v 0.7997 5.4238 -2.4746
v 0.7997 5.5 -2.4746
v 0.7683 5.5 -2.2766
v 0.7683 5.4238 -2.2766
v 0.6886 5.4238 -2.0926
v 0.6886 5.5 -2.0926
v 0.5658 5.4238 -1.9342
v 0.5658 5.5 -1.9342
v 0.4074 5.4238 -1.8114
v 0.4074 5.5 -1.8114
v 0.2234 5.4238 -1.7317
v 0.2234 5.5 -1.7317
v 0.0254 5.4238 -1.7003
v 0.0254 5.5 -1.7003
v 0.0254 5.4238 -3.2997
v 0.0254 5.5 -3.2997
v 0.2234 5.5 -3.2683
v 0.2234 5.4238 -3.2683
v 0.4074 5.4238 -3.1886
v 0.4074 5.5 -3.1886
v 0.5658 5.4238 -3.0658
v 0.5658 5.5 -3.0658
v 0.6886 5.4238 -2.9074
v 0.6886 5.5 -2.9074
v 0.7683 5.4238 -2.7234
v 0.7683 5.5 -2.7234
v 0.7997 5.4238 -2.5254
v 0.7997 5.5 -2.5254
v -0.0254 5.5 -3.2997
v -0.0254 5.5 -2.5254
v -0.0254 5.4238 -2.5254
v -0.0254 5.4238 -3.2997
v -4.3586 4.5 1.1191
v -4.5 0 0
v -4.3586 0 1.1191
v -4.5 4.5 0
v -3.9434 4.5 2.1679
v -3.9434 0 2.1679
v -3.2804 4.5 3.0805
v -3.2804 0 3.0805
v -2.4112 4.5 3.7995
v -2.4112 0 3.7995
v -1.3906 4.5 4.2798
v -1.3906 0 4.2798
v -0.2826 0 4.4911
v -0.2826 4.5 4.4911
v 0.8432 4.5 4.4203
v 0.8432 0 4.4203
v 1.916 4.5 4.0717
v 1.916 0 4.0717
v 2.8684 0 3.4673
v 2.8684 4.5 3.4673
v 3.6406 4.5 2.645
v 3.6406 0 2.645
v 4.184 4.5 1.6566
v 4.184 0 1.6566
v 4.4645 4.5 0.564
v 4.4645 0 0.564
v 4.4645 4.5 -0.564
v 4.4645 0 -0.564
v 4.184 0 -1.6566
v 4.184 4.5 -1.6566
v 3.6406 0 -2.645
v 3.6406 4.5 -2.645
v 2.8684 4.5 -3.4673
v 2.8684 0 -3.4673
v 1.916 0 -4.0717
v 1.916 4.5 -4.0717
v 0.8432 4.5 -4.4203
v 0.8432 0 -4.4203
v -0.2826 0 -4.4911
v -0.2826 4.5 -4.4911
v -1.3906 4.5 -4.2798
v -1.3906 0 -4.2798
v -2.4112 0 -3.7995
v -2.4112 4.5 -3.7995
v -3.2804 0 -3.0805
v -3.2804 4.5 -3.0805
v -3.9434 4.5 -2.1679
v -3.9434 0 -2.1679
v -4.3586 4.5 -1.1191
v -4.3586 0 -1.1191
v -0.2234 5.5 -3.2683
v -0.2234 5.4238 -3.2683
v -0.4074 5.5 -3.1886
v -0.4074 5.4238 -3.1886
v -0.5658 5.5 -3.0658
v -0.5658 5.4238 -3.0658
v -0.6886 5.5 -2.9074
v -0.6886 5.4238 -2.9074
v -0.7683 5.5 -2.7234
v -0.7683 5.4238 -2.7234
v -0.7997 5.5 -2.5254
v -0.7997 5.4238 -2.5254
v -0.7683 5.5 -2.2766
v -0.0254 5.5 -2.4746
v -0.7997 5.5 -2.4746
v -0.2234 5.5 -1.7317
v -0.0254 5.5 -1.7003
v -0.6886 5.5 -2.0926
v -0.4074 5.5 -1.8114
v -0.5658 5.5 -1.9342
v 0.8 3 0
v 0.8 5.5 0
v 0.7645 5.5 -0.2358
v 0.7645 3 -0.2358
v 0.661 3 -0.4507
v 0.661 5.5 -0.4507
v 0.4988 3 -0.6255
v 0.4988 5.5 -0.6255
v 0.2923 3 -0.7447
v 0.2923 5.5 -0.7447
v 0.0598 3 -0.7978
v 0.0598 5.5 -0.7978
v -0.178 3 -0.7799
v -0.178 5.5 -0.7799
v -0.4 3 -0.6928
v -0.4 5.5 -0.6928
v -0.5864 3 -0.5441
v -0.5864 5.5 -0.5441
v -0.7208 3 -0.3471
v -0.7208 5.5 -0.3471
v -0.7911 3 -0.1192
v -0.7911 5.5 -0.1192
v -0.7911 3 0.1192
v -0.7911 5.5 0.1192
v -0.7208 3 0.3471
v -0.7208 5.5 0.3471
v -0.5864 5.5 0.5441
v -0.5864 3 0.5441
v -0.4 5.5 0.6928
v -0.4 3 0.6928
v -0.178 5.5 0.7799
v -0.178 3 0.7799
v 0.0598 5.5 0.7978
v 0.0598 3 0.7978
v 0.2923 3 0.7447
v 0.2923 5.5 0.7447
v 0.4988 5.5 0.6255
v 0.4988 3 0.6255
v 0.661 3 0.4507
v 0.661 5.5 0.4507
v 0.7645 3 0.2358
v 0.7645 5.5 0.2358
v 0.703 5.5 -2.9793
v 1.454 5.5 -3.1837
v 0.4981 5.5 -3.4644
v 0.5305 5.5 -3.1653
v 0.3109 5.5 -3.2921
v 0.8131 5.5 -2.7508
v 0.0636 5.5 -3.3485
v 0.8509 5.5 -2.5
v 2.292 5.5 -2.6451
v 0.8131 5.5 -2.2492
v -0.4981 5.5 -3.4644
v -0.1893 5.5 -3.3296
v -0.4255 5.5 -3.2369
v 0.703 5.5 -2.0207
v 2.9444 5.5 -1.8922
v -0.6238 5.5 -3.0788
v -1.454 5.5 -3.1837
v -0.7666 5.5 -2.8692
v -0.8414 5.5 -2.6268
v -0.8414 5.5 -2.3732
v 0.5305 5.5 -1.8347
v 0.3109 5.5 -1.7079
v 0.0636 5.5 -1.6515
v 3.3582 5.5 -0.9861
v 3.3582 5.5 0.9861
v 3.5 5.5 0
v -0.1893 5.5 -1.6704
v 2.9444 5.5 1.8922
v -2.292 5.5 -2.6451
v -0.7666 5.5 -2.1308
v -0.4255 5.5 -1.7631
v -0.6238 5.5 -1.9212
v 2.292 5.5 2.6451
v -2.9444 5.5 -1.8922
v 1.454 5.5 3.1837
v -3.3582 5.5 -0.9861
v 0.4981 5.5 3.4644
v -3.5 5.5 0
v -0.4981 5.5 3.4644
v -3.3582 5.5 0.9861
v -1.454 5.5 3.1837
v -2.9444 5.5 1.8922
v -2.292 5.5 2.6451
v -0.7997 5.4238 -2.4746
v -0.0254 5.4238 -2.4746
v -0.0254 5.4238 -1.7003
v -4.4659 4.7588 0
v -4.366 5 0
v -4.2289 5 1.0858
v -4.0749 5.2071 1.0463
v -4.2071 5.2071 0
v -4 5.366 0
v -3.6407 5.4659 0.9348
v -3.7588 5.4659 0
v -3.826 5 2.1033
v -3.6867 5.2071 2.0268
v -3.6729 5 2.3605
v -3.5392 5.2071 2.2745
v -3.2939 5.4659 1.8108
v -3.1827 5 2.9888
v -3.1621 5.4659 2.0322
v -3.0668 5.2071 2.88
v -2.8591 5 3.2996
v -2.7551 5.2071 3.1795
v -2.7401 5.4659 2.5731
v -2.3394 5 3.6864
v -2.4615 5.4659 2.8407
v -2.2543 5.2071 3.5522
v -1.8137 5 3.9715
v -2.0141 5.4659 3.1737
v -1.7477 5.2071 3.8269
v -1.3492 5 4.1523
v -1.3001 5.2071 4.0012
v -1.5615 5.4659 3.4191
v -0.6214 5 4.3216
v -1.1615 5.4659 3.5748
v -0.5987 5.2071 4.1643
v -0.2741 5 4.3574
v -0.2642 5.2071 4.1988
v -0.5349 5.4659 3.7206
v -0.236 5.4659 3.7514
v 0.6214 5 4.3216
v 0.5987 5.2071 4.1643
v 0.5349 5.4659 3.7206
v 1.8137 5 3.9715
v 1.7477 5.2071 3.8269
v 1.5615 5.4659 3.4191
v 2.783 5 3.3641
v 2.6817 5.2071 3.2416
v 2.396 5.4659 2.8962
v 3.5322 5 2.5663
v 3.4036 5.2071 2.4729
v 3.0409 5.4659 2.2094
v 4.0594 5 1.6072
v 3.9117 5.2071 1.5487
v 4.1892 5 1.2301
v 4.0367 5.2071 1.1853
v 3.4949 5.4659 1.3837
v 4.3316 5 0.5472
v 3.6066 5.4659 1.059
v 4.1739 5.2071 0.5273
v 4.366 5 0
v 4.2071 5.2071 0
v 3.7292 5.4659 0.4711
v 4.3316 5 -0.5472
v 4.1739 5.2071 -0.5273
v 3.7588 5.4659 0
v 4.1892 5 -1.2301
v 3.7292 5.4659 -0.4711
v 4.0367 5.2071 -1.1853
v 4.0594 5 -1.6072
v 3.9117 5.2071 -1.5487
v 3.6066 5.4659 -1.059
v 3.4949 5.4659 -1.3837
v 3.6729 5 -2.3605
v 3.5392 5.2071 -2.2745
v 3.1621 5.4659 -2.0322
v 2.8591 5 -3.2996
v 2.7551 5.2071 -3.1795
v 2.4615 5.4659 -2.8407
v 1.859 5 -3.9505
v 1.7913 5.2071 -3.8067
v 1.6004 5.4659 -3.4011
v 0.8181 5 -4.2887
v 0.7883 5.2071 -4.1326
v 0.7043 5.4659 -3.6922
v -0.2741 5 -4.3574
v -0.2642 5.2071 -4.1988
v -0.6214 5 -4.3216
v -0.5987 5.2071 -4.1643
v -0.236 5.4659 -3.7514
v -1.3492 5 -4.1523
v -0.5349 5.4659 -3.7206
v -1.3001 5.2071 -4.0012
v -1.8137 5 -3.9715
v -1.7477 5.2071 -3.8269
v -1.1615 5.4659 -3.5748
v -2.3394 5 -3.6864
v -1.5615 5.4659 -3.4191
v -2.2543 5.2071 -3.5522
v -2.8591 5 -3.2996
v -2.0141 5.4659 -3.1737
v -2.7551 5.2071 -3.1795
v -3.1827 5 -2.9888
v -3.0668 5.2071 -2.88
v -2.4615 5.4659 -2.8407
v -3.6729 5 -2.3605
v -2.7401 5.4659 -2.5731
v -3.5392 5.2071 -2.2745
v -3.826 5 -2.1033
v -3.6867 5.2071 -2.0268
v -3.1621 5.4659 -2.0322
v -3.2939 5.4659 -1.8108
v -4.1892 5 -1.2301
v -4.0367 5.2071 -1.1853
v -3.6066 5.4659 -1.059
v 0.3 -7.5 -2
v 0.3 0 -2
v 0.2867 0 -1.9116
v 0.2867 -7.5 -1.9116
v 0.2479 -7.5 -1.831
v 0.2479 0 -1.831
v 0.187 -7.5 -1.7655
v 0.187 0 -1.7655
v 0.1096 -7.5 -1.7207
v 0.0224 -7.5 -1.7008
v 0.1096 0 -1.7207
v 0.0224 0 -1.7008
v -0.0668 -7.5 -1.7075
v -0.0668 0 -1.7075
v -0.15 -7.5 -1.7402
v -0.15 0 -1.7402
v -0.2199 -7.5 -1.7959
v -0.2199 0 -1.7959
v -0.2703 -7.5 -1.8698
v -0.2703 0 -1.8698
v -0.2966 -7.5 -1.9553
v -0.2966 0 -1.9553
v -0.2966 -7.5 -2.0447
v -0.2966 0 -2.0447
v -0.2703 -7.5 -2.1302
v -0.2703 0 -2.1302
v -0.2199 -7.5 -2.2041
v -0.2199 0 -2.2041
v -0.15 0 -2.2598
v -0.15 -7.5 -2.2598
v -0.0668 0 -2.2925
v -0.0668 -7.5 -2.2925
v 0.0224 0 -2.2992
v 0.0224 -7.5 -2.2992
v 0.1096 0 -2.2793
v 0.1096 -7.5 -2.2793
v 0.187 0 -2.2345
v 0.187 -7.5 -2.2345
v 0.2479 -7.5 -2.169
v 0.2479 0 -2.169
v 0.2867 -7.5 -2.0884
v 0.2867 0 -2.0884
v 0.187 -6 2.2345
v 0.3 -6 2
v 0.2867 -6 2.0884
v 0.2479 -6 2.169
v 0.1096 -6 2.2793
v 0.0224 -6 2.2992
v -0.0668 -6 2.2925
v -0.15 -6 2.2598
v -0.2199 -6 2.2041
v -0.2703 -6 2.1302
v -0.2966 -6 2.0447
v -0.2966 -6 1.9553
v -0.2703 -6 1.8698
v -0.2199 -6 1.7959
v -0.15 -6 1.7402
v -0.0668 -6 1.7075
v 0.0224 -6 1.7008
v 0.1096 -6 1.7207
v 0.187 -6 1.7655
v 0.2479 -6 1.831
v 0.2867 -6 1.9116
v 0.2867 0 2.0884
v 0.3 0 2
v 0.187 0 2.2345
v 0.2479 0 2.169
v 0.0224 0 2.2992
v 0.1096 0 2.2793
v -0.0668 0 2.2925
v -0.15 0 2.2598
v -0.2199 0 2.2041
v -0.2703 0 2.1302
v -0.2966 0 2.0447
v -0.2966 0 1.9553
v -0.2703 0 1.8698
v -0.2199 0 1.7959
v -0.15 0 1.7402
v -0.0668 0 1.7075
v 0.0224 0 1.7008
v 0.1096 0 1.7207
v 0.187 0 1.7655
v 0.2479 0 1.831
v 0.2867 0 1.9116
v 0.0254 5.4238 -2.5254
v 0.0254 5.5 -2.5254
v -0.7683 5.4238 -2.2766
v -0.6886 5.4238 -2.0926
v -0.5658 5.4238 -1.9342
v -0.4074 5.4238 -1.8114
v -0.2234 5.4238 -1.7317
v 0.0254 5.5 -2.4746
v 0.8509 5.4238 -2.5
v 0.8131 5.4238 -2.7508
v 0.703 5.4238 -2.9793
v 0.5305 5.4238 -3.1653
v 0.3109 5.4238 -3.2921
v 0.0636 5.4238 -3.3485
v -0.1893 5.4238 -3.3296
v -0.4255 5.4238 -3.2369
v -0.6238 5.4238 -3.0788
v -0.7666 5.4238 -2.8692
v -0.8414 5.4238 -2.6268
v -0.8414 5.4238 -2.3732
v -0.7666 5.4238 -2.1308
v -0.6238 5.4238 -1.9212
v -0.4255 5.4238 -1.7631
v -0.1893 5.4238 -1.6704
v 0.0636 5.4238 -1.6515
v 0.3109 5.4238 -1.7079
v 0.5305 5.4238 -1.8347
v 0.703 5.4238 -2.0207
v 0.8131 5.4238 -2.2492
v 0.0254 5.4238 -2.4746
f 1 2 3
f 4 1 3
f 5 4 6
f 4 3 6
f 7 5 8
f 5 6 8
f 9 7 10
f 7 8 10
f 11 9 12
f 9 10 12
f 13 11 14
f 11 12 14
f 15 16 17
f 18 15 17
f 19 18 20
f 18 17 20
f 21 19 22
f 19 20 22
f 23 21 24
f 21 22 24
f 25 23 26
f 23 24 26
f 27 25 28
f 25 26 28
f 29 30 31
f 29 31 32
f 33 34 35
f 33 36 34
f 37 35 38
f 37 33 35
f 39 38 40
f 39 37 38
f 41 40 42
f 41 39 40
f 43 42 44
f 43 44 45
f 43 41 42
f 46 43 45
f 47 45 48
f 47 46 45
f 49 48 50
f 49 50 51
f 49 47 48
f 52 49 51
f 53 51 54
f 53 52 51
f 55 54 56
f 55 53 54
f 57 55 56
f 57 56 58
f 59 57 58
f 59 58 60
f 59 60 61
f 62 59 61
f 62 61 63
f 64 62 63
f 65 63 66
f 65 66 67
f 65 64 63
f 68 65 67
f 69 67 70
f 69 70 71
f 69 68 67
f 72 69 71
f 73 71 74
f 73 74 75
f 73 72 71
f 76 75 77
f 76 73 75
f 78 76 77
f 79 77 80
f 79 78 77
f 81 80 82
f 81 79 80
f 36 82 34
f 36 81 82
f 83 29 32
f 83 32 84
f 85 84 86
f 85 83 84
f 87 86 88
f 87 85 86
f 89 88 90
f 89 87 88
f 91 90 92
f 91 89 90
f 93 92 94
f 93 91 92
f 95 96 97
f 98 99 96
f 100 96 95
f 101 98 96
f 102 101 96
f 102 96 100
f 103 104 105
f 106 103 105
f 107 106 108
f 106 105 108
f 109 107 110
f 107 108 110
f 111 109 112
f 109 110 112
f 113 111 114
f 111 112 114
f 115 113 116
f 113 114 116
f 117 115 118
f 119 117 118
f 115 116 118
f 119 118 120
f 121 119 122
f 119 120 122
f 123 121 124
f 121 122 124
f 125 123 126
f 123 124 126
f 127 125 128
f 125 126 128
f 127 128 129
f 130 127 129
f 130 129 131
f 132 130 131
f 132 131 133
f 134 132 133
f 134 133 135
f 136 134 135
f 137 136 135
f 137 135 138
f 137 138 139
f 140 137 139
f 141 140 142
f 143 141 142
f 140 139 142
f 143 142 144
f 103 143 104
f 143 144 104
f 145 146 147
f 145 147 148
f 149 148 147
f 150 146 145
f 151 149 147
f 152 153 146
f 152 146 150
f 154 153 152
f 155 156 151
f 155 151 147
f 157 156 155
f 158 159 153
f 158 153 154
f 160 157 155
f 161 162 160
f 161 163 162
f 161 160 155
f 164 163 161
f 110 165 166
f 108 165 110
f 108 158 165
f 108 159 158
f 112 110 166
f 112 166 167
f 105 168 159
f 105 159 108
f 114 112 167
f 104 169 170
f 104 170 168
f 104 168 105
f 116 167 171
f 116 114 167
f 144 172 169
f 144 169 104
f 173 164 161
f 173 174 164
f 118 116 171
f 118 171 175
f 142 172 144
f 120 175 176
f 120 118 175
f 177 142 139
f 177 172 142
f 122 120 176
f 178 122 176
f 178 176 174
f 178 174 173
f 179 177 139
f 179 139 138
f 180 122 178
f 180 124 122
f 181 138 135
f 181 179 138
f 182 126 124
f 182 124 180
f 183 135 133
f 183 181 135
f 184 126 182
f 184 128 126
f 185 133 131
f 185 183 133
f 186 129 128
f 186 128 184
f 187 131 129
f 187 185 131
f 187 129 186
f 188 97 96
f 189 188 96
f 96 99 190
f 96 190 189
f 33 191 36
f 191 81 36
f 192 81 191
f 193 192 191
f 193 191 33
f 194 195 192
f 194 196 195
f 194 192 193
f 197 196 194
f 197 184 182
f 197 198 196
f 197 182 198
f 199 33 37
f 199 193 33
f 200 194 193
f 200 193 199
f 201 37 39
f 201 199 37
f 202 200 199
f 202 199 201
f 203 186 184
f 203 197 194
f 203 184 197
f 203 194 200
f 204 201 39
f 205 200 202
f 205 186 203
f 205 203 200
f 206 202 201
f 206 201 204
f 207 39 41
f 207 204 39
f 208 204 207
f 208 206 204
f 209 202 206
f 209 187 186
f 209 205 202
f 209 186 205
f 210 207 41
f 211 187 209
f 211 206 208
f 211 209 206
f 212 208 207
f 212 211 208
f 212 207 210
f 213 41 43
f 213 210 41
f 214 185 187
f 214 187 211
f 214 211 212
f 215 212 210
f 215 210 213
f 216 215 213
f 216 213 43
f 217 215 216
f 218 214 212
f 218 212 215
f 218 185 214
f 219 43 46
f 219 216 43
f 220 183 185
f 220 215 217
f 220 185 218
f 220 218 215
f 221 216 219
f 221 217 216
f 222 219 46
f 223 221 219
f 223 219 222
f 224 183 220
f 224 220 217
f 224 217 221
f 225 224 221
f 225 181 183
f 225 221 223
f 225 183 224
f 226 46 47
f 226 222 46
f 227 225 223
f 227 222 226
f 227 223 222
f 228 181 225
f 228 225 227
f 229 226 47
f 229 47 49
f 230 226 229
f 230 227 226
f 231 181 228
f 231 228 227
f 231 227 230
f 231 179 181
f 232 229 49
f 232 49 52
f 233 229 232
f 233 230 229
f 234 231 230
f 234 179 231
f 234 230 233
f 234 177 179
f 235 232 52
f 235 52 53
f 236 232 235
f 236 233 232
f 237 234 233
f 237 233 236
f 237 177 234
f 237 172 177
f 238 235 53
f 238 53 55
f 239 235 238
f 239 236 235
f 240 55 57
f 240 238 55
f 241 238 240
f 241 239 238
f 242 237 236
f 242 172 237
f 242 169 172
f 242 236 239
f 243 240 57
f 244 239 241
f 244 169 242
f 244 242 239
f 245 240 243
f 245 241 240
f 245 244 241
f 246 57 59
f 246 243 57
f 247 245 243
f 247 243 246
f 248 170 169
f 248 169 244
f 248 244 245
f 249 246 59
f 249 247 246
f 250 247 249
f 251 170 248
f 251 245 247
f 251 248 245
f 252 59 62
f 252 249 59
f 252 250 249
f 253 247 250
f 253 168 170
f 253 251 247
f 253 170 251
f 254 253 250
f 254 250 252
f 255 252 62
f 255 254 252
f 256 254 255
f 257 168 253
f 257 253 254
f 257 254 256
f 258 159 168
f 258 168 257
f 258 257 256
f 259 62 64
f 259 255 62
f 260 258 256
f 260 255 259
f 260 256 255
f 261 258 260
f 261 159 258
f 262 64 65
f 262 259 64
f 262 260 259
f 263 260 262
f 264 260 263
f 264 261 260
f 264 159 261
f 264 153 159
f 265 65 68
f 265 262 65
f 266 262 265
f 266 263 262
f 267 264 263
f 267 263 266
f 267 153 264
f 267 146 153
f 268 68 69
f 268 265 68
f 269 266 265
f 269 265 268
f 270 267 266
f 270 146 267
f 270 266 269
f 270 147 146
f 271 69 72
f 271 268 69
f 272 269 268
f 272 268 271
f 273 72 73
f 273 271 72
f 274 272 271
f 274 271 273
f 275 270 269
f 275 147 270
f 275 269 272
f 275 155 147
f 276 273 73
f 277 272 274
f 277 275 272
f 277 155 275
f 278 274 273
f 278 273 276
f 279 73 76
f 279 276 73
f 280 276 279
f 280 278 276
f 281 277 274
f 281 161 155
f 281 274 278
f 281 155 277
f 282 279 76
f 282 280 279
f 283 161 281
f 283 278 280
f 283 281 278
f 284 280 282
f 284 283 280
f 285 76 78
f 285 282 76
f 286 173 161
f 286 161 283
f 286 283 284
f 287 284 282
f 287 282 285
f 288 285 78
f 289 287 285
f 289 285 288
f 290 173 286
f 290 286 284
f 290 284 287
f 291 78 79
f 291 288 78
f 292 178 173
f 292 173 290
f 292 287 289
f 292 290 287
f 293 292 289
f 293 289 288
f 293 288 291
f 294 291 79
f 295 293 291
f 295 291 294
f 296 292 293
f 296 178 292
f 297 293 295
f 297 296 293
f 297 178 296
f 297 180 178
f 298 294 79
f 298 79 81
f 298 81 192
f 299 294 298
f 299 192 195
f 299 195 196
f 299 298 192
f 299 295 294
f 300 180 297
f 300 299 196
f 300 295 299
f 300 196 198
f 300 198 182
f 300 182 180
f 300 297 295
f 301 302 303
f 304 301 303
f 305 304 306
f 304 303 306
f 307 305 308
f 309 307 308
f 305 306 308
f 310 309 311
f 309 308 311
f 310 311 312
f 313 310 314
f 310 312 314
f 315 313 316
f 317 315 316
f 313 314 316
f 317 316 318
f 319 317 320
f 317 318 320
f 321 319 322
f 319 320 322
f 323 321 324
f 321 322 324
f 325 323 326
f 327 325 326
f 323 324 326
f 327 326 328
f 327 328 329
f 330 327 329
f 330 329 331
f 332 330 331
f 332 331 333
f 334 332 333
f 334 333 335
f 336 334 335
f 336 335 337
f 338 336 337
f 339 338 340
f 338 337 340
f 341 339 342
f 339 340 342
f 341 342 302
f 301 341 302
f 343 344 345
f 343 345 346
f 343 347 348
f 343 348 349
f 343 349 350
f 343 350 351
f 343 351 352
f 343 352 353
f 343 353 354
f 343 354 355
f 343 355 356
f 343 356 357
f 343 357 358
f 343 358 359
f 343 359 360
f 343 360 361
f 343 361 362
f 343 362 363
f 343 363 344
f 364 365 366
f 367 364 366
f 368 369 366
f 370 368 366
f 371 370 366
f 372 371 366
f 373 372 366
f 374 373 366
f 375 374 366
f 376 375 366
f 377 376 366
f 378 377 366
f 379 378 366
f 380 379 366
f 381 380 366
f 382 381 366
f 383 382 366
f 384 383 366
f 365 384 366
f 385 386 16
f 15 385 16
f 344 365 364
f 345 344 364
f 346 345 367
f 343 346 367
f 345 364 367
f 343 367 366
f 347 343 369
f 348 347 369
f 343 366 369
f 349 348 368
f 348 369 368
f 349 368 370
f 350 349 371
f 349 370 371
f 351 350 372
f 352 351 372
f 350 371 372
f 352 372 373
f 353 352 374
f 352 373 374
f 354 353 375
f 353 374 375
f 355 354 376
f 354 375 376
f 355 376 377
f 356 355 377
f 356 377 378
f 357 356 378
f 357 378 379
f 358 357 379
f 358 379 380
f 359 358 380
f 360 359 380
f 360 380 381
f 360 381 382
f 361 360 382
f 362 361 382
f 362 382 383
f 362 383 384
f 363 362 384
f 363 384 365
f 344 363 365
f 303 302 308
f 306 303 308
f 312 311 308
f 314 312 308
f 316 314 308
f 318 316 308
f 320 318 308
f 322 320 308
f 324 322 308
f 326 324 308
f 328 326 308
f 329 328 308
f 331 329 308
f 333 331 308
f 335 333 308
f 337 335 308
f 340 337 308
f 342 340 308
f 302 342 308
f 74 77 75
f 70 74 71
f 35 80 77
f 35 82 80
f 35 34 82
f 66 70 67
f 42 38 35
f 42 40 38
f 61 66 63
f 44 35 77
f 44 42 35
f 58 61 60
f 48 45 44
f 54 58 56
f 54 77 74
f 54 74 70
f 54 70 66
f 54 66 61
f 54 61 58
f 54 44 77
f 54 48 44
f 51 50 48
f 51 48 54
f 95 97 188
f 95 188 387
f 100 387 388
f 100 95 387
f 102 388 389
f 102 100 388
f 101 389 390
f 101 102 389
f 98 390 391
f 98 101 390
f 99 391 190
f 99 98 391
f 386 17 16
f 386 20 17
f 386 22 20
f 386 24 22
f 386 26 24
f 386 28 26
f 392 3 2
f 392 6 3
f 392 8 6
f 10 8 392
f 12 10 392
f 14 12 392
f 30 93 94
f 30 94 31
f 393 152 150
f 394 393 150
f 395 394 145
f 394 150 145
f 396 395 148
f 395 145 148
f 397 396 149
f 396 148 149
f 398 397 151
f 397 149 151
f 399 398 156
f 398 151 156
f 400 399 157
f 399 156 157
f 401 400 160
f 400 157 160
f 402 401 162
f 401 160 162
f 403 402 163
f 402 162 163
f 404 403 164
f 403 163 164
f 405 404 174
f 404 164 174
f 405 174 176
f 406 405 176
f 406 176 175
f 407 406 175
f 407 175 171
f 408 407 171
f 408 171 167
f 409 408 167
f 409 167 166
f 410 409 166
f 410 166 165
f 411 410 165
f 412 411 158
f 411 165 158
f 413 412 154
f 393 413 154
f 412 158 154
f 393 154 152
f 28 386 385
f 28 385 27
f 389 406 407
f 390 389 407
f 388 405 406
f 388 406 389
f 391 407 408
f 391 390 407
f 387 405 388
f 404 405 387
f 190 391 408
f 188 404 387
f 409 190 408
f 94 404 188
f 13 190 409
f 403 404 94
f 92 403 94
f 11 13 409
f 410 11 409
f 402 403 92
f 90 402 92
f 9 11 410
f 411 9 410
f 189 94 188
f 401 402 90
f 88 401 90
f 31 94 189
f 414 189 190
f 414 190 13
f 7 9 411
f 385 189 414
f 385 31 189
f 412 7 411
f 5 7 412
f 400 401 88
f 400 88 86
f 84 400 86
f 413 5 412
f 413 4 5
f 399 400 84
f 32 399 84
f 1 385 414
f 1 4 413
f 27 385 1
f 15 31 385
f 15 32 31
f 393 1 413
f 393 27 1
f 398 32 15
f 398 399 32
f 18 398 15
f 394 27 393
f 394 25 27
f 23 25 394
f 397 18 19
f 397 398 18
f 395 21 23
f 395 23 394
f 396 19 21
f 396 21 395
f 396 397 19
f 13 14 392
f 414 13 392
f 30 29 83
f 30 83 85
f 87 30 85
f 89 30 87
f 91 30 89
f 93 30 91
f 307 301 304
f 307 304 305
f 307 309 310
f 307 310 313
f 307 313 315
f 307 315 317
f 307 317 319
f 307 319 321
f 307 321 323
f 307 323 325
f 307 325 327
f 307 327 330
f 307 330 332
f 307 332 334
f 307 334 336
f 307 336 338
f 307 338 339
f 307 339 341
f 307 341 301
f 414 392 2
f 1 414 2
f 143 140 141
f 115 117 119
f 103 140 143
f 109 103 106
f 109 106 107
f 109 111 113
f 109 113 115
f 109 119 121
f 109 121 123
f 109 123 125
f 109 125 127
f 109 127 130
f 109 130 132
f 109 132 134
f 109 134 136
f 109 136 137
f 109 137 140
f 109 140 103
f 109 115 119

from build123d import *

# Parameters (mm, degrees)
SKETCH2_R               = 0.3
LEADS_DEPTH             = 7.5
LEADS_2_DEPTH           = 7.5
SKETCH3_R               = 0.3
CUT_EXTRUDE1_DEPTH      = 1.5
SKETCH4_R               = 0.8
CUT_EXTRUDE2_DEPTH      = 2.5
SKETCH6_R               = 0.8509
SKETCH6_R_2             = 0.8001
SKETCH6_W               = 0.0508
SKETCH6_H               = 1.651
SKETCH6_W_2             = 1.651
SKETCH6_H_2             = 0.0508
CUT_EXTRUDE_THIN1_DEPTH = 0.0762


with BuildPart() as part:
    # Sketch1 → Body (revolve)
    with BuildSketch(Plane.XY):
        with BuildLine():
            Line((-4.5, 0), (-4.5, 4.5))
            ThreePointArc((-4.5, 4.5), (-4.207106781, 5.207106781), (-3.5, 5.5))
            Line((-3.5, 5.5), (0, 5.5))
            Line((0, 5.5), (0, 0))
            Line((0, 0), (-4.5, 0))
        make_face()
    revolve(axis=Axis((0, 0, 0), (0, 1, 0)))

    # Sketch4 → Cut-Extrude2 (cut)
    with BuildSketch(Plane(origin=(0, 5.5, 0), x_dir=(1, 0, 0), z_dir=(0, 1, 0))):
        Circle(SKETCH4_R)
    extrude(amount=-CUT_EXTRUDE2_DEPTH, mode=Mode.SUBTRACT)

    # Sketch6 → Cut-Extrude-Thin1 (cut)
    with BuildSketch(Plane(origin=(0, 5.5, 0), x_dir=(1, 0, 0), z_dir=(0, 1, 0))):
        with Locations((0, 2.5)):
            Circle(SKETCH6_R)
        with Locations((0, 2.5)):
            Circle(SKETCH6_R_2, mode=Mode.SUBTRACT)
        with Locations((0, 2.5)):
            Rectangle(SKETCH6_W, SKETCH6_H)
        with Locations((0, 2.5)):
            Rectangle(SKETCH6_W_2, SKETCH6_H_2)
    extrude(amount=-CUT_EXTRUDE_THIN1_DEPTH, mode=Mode.SUBTRACT)


with BuildPart() as body_2:
    # Sketch2 → Leads (new body)
    with BuildSketch(Plane.XZ):
        with Locations((0, 2)):
            Circle(SKETCH2_R)
    extrude(amount=LEADS_DEPTH)

    # Sketch3 → Cut-Extrude1 (cut)
    with BuildSketch(Plane.XZ.offset(7.5)):
        with Locations((0, 2)):
            Circle(SKETCH3_R)
    extrude(amount=-CUT_EXTRUDE1_DEPTH, mode=Mode.SUBTRACT)


with BuildPart() as body_3:
    # Sketch2 → Leads 2 (new body)
    with BuildSketch(Plane.XZ):
        with Locations((0, -2)):
            Circle(SKETCH2_R)
    extrude(amount=LEADS_2_DEPTH)


solid = Compound([part.part, body_2.part, body_3.part])
